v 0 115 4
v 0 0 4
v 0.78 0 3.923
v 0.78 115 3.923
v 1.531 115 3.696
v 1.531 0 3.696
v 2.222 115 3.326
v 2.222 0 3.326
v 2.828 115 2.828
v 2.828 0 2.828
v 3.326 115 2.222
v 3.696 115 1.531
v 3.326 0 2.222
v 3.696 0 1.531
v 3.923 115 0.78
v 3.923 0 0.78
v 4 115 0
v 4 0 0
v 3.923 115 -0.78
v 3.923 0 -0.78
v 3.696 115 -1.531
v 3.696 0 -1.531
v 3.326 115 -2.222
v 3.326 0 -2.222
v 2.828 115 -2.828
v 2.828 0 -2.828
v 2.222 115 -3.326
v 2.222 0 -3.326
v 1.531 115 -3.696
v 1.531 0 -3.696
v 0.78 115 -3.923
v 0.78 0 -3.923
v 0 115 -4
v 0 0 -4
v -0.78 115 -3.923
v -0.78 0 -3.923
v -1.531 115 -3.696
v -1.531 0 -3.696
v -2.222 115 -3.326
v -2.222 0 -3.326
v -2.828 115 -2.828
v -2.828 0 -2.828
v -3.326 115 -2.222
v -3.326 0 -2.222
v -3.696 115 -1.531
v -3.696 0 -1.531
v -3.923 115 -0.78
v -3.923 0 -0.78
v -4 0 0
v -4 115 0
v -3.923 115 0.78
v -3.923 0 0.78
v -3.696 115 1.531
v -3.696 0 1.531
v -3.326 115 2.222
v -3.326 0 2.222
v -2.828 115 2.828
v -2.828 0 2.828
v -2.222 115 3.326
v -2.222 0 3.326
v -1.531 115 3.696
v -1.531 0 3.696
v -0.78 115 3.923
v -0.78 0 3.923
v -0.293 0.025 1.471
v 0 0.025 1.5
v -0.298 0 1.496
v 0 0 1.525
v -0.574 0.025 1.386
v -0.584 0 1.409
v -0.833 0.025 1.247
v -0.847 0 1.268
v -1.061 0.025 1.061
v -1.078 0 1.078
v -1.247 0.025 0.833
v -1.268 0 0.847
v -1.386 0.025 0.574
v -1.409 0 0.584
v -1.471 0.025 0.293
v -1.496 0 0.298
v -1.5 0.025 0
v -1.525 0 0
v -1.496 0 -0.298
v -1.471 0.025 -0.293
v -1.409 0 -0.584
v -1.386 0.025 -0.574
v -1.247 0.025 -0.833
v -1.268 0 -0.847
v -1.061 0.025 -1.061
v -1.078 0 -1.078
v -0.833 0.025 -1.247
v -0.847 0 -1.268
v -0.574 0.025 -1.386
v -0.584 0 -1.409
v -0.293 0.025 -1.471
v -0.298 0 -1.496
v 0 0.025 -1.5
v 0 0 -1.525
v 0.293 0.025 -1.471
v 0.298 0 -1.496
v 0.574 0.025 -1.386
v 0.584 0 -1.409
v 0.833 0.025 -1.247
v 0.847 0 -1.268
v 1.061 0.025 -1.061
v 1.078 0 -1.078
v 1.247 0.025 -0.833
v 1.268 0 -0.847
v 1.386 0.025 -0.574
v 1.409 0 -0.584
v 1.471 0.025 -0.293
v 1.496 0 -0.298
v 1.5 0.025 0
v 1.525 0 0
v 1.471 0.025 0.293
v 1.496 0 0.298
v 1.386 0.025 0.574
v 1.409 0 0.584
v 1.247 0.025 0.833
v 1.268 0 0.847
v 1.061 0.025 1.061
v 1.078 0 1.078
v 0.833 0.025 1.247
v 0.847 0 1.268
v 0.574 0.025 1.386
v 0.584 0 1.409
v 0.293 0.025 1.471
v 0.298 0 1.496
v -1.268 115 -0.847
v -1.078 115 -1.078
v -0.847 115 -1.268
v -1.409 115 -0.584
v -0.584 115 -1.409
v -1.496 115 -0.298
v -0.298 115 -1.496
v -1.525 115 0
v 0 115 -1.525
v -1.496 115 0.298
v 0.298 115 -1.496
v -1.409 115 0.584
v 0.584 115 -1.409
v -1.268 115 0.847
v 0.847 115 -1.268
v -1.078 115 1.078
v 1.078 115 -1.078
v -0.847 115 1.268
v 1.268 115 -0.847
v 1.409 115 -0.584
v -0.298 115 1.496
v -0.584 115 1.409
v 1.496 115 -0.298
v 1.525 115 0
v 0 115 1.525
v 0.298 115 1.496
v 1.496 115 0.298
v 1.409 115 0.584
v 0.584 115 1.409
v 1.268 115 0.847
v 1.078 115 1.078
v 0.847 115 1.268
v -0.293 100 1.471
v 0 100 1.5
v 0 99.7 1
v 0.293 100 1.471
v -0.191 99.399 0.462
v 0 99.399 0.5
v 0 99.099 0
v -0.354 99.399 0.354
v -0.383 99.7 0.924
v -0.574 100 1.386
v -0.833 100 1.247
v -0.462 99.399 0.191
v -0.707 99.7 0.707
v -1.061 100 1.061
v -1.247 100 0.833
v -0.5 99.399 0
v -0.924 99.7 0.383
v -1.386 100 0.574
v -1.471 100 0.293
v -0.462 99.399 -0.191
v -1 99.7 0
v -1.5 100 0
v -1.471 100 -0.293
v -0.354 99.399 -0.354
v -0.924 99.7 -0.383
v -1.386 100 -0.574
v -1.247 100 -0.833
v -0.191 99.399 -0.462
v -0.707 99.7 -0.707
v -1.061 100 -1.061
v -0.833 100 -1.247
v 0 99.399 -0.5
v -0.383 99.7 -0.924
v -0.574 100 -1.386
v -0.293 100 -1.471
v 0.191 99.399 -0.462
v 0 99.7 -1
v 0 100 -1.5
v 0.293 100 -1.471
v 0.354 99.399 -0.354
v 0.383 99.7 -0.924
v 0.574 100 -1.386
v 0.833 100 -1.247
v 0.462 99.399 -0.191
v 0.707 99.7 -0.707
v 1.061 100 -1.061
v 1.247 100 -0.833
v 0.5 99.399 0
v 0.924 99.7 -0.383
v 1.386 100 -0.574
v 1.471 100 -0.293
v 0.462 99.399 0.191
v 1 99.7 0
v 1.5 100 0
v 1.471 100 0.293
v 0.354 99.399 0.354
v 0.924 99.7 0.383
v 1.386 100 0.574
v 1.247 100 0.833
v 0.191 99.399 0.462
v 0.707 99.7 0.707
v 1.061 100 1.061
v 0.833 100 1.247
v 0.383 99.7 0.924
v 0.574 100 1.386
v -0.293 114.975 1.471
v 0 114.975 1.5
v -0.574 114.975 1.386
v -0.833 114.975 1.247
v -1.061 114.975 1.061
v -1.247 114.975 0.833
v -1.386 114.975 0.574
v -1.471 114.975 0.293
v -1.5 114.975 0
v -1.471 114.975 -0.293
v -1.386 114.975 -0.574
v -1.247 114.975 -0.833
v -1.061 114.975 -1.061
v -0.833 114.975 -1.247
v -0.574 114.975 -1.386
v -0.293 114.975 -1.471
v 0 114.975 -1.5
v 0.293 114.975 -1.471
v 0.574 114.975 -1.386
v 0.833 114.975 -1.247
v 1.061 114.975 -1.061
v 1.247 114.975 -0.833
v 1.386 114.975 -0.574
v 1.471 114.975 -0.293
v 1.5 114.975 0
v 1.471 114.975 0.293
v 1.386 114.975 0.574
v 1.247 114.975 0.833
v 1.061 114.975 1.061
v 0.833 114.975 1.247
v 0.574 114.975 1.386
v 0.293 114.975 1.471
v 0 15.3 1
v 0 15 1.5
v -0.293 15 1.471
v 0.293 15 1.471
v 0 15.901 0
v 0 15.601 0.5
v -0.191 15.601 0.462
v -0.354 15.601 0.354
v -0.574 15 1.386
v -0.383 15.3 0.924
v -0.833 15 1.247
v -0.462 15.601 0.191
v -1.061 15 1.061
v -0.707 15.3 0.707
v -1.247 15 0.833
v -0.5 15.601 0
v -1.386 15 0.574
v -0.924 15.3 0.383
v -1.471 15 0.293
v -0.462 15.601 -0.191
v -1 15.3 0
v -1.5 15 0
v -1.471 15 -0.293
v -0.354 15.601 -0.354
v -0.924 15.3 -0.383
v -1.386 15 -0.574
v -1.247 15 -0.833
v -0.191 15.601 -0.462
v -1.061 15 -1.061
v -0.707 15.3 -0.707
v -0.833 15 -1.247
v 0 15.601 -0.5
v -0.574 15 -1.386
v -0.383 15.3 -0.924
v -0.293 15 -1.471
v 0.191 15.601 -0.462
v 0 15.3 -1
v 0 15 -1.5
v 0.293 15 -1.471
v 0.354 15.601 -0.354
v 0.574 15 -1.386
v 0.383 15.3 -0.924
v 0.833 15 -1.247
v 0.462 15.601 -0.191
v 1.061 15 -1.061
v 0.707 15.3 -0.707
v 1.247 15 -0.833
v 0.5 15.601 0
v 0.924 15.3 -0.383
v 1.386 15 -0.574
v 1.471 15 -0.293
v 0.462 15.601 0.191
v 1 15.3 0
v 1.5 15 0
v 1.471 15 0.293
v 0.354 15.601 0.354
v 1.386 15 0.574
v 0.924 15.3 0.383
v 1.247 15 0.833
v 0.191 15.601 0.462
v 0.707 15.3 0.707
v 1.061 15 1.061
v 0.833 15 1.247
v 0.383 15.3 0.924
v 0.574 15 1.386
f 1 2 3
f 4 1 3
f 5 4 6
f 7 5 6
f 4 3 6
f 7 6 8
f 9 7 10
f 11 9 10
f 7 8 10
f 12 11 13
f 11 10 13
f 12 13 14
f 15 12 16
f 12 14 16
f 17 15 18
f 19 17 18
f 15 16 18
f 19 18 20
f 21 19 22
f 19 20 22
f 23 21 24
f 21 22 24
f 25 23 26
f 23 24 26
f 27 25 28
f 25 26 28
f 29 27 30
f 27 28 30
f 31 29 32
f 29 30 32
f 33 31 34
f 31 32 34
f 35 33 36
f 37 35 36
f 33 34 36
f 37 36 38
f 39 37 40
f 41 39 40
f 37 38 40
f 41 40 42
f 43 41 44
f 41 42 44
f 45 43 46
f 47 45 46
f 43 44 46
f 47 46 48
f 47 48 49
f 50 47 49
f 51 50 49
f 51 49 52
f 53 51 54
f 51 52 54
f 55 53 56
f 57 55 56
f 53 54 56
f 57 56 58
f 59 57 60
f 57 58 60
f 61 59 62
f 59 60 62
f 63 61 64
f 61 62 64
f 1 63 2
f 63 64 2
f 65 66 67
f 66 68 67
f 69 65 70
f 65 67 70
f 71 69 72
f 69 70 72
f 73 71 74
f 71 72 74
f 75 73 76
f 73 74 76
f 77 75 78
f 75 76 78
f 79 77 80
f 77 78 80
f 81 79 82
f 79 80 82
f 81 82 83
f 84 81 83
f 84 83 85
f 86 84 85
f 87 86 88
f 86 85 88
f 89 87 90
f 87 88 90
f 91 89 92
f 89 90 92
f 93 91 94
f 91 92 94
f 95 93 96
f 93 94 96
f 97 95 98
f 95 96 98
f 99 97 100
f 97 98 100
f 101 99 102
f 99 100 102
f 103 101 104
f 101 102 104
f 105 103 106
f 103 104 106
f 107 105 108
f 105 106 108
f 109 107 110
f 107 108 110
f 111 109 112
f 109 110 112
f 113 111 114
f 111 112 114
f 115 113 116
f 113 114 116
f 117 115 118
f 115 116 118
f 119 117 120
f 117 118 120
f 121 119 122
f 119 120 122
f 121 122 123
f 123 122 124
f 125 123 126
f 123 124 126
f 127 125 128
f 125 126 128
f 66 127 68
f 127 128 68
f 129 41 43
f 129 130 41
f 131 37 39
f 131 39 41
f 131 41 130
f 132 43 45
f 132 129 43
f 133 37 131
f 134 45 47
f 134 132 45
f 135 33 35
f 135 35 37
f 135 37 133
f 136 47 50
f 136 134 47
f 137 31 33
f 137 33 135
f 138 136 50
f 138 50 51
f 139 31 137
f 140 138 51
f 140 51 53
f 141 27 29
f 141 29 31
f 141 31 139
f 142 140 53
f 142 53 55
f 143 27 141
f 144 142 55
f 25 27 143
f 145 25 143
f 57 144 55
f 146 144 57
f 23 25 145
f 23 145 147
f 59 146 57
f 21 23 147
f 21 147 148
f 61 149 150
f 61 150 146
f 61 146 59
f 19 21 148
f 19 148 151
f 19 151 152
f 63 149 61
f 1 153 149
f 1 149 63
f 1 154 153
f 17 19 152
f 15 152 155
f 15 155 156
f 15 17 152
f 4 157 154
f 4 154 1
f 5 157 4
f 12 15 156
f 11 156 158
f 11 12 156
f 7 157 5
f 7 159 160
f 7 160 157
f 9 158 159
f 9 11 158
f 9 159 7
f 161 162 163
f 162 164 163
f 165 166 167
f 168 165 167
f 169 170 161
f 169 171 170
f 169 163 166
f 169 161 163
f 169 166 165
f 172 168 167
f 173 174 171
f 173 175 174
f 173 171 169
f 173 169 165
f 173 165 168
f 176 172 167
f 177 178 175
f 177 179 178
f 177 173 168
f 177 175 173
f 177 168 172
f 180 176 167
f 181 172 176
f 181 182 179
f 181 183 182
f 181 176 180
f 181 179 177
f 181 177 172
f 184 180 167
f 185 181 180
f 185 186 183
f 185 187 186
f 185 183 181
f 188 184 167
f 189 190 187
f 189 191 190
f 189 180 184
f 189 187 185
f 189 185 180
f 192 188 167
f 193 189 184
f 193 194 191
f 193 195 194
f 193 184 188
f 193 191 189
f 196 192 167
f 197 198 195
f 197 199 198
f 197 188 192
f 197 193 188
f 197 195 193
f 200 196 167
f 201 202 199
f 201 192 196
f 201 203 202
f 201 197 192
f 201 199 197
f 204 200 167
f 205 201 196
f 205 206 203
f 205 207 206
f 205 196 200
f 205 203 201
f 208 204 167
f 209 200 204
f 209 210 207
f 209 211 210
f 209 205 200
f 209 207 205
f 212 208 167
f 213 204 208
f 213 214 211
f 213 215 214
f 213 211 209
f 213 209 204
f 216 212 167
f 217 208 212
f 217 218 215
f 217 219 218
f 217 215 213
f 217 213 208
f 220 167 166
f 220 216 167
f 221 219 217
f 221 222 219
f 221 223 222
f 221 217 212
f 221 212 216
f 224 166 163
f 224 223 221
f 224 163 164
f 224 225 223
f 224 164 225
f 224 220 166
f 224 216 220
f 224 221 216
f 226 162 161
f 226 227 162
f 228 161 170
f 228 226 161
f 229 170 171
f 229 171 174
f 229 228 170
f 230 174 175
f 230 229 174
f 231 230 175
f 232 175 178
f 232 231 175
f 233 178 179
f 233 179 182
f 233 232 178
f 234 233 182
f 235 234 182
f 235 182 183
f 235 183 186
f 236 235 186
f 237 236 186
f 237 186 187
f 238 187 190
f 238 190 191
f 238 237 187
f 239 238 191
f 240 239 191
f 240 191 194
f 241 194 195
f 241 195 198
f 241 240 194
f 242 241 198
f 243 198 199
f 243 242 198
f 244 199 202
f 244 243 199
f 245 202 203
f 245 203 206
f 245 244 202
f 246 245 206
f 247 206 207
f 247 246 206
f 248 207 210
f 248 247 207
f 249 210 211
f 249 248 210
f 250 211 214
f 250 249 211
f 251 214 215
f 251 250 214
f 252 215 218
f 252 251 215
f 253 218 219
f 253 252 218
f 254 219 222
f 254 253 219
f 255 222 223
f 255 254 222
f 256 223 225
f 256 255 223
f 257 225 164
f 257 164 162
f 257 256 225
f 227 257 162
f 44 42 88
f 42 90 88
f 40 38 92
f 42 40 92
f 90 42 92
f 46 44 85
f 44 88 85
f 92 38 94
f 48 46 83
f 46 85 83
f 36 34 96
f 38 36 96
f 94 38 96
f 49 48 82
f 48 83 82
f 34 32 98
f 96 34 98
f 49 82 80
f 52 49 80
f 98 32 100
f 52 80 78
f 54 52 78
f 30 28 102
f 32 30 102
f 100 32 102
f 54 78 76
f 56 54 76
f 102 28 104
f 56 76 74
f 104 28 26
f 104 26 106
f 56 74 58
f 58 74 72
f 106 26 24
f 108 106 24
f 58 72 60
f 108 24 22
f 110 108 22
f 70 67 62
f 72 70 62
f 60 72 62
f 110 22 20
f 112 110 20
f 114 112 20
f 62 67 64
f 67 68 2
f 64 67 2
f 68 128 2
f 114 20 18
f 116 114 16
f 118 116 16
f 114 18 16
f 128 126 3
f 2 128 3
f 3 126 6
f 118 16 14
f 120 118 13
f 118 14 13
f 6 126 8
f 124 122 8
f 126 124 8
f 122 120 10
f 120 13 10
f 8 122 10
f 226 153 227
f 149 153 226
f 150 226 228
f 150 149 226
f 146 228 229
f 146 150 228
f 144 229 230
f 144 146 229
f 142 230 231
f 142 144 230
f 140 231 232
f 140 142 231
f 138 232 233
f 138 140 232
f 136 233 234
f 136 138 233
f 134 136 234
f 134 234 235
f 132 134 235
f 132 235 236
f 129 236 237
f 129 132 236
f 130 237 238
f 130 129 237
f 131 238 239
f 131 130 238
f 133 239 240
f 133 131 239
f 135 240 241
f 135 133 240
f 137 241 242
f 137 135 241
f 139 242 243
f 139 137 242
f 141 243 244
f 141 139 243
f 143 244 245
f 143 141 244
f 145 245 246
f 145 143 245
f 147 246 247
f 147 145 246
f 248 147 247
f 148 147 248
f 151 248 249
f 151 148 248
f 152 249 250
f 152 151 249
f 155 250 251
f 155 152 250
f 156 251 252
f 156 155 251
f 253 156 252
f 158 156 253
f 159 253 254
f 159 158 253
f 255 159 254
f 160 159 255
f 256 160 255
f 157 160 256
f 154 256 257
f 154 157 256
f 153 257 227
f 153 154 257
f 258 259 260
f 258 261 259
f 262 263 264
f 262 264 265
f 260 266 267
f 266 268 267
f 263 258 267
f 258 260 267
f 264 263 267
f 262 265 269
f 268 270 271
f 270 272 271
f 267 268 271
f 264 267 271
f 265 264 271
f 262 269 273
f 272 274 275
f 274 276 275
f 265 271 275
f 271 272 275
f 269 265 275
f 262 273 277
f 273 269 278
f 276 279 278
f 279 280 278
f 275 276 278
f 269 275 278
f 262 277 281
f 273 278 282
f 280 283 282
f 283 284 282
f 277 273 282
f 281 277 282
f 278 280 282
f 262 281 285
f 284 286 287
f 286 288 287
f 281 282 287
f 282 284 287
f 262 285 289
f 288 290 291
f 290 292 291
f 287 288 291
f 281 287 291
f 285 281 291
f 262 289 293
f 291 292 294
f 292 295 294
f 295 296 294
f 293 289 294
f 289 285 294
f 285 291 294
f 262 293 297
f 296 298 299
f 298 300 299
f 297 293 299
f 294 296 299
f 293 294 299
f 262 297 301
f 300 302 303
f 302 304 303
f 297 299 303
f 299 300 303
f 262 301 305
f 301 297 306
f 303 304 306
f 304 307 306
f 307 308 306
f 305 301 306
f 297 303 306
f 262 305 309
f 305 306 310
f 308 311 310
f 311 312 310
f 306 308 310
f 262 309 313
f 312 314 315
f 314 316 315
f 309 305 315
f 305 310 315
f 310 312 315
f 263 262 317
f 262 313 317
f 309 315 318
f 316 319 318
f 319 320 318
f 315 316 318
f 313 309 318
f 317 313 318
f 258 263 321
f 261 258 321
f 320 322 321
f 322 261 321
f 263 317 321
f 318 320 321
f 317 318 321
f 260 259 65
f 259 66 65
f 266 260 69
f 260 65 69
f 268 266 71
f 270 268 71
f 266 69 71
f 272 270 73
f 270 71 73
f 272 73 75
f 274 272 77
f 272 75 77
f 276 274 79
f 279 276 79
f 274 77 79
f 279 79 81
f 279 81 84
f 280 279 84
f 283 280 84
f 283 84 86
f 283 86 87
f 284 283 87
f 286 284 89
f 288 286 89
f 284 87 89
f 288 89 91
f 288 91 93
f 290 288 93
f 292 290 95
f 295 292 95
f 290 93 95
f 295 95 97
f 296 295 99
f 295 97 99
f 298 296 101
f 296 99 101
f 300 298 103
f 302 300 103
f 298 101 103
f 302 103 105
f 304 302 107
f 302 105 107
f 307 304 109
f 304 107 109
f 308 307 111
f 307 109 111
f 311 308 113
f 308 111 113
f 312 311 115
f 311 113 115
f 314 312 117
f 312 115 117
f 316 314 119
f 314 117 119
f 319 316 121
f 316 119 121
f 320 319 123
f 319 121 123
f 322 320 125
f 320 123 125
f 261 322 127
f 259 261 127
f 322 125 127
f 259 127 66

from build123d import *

# Parameters (mm, degrees)
SKETCH2_R           = 4
BOSS_EXTRUDE1_DEPTH = 115


with BuildPart() as part:
    # Sketch2 → Boss-Extrude1 (new body)
    with BuildSketch(Plane(origin=(0, 0, 0), x_dir=(1, 0, 0), z_dir=(0, 1, 0))):
        with Locations(Location((0, 0, 0), (0, 0, 270))):
            Circle(SKETCH2_R)
    extrude(amount=BOSS_EXTRUDE1_DEPTH)

    # Sketch5 → Ø3.0mm Dowel Hole1 (revolve, cut)
    with BuildSketch(Plane(origin=(0, 115, 0), x_dir=(0, 0, 1), z_dir=(1, 0, 0))):
        Polygon((0, 0), (0, 15.901290929), (1.5, 15), (1.5, 0.025), (1.525, 0), align=None)
    f_3_0mm_dowel_hole1 = revolve(axis=Axis((0, 121.35, 0), (0, -1, 0)), mode=Mode.SUBTRACT)

    # Mirror1: Ø3.0mm Dowel Hole1 across plane
    add(f_3_0mm_dowel_hole1.mirror(Plane.ZX.offset(57.5)), mode=Mode.SUBTRACT)


solid = part.part
